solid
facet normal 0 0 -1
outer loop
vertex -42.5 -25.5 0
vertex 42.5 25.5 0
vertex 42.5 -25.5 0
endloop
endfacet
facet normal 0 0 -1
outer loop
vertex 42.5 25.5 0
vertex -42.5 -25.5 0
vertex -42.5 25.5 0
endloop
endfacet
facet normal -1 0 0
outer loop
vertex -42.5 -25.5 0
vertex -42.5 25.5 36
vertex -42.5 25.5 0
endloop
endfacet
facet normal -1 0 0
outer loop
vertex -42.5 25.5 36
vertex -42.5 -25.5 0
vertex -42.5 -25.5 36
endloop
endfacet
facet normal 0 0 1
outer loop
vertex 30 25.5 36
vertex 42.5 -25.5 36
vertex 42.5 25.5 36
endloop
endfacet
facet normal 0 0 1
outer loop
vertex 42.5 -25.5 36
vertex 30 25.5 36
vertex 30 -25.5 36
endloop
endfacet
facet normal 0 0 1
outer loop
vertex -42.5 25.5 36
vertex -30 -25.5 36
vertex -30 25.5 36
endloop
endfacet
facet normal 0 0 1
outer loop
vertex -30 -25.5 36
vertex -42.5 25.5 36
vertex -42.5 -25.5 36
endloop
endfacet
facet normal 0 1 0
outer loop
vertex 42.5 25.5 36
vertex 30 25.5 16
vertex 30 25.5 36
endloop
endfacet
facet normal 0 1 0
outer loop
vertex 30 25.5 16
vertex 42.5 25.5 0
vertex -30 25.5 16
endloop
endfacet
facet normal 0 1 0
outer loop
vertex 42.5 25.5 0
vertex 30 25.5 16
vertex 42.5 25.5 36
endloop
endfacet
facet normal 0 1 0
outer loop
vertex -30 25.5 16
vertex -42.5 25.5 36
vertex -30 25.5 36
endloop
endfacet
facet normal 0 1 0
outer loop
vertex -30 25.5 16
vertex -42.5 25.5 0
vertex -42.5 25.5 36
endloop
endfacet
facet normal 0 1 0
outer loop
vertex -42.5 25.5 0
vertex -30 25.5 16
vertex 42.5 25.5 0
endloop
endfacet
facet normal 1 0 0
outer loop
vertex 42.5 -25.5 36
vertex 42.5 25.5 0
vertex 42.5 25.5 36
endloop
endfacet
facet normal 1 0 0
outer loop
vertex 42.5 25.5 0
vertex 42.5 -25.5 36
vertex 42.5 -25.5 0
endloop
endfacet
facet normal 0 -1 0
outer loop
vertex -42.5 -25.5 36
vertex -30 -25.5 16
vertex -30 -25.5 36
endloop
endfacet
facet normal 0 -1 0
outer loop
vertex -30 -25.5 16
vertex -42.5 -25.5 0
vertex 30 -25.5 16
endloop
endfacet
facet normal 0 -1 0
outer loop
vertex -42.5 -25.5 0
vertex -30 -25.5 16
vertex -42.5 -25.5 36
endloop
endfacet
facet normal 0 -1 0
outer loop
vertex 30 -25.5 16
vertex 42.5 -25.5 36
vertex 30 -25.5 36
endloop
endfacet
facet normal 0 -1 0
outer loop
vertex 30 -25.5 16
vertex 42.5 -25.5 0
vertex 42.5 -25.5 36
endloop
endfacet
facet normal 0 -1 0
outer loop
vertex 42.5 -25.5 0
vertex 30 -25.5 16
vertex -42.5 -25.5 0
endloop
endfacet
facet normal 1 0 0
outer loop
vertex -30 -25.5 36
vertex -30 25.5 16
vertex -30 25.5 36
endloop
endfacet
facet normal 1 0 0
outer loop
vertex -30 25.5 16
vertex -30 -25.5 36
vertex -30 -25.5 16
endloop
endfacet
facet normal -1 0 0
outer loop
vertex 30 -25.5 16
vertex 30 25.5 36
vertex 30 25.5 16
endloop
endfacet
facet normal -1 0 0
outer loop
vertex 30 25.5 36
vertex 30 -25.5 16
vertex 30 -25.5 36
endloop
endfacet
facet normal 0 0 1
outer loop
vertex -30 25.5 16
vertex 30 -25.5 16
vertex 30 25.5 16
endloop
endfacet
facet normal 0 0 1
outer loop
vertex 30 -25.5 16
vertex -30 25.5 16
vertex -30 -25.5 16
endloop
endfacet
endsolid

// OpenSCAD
bodyLength = 85;
bodyWidth = 51;
bodyHeight = 36;


module makeBody(bodyLength, bodyWidth, bodyHeight) {
	linear_extrude(bodyHeight) {
	        square([bodyLength,bodyWidth], center=true);
	    }
}

module makeBodyCutout(bodyWidth, bodyHeight) {
	bodyCutoutHeight = bodyHeight - 16;
	translate([0,(bodyWidth/2+5) ,26]) {
	    rotate(a=[90,0,0]) {
	    	linear_extrude(bodyWidth+10) {
	   			square([60, bodyCutoutHeight], center=true);
	   		}
	   	}
    }
}

module viseBody(bodyLength, bodyWidth, bodyHeight) {
    difference() {
    	makeBody(bodyLength, bodyWidth, bodyHeight);
    	makeBodyCutout(bodyWidth, bodyHeight);    
	}
}


viseBody(bodyLength,bodyWidth,bodyHeight);
